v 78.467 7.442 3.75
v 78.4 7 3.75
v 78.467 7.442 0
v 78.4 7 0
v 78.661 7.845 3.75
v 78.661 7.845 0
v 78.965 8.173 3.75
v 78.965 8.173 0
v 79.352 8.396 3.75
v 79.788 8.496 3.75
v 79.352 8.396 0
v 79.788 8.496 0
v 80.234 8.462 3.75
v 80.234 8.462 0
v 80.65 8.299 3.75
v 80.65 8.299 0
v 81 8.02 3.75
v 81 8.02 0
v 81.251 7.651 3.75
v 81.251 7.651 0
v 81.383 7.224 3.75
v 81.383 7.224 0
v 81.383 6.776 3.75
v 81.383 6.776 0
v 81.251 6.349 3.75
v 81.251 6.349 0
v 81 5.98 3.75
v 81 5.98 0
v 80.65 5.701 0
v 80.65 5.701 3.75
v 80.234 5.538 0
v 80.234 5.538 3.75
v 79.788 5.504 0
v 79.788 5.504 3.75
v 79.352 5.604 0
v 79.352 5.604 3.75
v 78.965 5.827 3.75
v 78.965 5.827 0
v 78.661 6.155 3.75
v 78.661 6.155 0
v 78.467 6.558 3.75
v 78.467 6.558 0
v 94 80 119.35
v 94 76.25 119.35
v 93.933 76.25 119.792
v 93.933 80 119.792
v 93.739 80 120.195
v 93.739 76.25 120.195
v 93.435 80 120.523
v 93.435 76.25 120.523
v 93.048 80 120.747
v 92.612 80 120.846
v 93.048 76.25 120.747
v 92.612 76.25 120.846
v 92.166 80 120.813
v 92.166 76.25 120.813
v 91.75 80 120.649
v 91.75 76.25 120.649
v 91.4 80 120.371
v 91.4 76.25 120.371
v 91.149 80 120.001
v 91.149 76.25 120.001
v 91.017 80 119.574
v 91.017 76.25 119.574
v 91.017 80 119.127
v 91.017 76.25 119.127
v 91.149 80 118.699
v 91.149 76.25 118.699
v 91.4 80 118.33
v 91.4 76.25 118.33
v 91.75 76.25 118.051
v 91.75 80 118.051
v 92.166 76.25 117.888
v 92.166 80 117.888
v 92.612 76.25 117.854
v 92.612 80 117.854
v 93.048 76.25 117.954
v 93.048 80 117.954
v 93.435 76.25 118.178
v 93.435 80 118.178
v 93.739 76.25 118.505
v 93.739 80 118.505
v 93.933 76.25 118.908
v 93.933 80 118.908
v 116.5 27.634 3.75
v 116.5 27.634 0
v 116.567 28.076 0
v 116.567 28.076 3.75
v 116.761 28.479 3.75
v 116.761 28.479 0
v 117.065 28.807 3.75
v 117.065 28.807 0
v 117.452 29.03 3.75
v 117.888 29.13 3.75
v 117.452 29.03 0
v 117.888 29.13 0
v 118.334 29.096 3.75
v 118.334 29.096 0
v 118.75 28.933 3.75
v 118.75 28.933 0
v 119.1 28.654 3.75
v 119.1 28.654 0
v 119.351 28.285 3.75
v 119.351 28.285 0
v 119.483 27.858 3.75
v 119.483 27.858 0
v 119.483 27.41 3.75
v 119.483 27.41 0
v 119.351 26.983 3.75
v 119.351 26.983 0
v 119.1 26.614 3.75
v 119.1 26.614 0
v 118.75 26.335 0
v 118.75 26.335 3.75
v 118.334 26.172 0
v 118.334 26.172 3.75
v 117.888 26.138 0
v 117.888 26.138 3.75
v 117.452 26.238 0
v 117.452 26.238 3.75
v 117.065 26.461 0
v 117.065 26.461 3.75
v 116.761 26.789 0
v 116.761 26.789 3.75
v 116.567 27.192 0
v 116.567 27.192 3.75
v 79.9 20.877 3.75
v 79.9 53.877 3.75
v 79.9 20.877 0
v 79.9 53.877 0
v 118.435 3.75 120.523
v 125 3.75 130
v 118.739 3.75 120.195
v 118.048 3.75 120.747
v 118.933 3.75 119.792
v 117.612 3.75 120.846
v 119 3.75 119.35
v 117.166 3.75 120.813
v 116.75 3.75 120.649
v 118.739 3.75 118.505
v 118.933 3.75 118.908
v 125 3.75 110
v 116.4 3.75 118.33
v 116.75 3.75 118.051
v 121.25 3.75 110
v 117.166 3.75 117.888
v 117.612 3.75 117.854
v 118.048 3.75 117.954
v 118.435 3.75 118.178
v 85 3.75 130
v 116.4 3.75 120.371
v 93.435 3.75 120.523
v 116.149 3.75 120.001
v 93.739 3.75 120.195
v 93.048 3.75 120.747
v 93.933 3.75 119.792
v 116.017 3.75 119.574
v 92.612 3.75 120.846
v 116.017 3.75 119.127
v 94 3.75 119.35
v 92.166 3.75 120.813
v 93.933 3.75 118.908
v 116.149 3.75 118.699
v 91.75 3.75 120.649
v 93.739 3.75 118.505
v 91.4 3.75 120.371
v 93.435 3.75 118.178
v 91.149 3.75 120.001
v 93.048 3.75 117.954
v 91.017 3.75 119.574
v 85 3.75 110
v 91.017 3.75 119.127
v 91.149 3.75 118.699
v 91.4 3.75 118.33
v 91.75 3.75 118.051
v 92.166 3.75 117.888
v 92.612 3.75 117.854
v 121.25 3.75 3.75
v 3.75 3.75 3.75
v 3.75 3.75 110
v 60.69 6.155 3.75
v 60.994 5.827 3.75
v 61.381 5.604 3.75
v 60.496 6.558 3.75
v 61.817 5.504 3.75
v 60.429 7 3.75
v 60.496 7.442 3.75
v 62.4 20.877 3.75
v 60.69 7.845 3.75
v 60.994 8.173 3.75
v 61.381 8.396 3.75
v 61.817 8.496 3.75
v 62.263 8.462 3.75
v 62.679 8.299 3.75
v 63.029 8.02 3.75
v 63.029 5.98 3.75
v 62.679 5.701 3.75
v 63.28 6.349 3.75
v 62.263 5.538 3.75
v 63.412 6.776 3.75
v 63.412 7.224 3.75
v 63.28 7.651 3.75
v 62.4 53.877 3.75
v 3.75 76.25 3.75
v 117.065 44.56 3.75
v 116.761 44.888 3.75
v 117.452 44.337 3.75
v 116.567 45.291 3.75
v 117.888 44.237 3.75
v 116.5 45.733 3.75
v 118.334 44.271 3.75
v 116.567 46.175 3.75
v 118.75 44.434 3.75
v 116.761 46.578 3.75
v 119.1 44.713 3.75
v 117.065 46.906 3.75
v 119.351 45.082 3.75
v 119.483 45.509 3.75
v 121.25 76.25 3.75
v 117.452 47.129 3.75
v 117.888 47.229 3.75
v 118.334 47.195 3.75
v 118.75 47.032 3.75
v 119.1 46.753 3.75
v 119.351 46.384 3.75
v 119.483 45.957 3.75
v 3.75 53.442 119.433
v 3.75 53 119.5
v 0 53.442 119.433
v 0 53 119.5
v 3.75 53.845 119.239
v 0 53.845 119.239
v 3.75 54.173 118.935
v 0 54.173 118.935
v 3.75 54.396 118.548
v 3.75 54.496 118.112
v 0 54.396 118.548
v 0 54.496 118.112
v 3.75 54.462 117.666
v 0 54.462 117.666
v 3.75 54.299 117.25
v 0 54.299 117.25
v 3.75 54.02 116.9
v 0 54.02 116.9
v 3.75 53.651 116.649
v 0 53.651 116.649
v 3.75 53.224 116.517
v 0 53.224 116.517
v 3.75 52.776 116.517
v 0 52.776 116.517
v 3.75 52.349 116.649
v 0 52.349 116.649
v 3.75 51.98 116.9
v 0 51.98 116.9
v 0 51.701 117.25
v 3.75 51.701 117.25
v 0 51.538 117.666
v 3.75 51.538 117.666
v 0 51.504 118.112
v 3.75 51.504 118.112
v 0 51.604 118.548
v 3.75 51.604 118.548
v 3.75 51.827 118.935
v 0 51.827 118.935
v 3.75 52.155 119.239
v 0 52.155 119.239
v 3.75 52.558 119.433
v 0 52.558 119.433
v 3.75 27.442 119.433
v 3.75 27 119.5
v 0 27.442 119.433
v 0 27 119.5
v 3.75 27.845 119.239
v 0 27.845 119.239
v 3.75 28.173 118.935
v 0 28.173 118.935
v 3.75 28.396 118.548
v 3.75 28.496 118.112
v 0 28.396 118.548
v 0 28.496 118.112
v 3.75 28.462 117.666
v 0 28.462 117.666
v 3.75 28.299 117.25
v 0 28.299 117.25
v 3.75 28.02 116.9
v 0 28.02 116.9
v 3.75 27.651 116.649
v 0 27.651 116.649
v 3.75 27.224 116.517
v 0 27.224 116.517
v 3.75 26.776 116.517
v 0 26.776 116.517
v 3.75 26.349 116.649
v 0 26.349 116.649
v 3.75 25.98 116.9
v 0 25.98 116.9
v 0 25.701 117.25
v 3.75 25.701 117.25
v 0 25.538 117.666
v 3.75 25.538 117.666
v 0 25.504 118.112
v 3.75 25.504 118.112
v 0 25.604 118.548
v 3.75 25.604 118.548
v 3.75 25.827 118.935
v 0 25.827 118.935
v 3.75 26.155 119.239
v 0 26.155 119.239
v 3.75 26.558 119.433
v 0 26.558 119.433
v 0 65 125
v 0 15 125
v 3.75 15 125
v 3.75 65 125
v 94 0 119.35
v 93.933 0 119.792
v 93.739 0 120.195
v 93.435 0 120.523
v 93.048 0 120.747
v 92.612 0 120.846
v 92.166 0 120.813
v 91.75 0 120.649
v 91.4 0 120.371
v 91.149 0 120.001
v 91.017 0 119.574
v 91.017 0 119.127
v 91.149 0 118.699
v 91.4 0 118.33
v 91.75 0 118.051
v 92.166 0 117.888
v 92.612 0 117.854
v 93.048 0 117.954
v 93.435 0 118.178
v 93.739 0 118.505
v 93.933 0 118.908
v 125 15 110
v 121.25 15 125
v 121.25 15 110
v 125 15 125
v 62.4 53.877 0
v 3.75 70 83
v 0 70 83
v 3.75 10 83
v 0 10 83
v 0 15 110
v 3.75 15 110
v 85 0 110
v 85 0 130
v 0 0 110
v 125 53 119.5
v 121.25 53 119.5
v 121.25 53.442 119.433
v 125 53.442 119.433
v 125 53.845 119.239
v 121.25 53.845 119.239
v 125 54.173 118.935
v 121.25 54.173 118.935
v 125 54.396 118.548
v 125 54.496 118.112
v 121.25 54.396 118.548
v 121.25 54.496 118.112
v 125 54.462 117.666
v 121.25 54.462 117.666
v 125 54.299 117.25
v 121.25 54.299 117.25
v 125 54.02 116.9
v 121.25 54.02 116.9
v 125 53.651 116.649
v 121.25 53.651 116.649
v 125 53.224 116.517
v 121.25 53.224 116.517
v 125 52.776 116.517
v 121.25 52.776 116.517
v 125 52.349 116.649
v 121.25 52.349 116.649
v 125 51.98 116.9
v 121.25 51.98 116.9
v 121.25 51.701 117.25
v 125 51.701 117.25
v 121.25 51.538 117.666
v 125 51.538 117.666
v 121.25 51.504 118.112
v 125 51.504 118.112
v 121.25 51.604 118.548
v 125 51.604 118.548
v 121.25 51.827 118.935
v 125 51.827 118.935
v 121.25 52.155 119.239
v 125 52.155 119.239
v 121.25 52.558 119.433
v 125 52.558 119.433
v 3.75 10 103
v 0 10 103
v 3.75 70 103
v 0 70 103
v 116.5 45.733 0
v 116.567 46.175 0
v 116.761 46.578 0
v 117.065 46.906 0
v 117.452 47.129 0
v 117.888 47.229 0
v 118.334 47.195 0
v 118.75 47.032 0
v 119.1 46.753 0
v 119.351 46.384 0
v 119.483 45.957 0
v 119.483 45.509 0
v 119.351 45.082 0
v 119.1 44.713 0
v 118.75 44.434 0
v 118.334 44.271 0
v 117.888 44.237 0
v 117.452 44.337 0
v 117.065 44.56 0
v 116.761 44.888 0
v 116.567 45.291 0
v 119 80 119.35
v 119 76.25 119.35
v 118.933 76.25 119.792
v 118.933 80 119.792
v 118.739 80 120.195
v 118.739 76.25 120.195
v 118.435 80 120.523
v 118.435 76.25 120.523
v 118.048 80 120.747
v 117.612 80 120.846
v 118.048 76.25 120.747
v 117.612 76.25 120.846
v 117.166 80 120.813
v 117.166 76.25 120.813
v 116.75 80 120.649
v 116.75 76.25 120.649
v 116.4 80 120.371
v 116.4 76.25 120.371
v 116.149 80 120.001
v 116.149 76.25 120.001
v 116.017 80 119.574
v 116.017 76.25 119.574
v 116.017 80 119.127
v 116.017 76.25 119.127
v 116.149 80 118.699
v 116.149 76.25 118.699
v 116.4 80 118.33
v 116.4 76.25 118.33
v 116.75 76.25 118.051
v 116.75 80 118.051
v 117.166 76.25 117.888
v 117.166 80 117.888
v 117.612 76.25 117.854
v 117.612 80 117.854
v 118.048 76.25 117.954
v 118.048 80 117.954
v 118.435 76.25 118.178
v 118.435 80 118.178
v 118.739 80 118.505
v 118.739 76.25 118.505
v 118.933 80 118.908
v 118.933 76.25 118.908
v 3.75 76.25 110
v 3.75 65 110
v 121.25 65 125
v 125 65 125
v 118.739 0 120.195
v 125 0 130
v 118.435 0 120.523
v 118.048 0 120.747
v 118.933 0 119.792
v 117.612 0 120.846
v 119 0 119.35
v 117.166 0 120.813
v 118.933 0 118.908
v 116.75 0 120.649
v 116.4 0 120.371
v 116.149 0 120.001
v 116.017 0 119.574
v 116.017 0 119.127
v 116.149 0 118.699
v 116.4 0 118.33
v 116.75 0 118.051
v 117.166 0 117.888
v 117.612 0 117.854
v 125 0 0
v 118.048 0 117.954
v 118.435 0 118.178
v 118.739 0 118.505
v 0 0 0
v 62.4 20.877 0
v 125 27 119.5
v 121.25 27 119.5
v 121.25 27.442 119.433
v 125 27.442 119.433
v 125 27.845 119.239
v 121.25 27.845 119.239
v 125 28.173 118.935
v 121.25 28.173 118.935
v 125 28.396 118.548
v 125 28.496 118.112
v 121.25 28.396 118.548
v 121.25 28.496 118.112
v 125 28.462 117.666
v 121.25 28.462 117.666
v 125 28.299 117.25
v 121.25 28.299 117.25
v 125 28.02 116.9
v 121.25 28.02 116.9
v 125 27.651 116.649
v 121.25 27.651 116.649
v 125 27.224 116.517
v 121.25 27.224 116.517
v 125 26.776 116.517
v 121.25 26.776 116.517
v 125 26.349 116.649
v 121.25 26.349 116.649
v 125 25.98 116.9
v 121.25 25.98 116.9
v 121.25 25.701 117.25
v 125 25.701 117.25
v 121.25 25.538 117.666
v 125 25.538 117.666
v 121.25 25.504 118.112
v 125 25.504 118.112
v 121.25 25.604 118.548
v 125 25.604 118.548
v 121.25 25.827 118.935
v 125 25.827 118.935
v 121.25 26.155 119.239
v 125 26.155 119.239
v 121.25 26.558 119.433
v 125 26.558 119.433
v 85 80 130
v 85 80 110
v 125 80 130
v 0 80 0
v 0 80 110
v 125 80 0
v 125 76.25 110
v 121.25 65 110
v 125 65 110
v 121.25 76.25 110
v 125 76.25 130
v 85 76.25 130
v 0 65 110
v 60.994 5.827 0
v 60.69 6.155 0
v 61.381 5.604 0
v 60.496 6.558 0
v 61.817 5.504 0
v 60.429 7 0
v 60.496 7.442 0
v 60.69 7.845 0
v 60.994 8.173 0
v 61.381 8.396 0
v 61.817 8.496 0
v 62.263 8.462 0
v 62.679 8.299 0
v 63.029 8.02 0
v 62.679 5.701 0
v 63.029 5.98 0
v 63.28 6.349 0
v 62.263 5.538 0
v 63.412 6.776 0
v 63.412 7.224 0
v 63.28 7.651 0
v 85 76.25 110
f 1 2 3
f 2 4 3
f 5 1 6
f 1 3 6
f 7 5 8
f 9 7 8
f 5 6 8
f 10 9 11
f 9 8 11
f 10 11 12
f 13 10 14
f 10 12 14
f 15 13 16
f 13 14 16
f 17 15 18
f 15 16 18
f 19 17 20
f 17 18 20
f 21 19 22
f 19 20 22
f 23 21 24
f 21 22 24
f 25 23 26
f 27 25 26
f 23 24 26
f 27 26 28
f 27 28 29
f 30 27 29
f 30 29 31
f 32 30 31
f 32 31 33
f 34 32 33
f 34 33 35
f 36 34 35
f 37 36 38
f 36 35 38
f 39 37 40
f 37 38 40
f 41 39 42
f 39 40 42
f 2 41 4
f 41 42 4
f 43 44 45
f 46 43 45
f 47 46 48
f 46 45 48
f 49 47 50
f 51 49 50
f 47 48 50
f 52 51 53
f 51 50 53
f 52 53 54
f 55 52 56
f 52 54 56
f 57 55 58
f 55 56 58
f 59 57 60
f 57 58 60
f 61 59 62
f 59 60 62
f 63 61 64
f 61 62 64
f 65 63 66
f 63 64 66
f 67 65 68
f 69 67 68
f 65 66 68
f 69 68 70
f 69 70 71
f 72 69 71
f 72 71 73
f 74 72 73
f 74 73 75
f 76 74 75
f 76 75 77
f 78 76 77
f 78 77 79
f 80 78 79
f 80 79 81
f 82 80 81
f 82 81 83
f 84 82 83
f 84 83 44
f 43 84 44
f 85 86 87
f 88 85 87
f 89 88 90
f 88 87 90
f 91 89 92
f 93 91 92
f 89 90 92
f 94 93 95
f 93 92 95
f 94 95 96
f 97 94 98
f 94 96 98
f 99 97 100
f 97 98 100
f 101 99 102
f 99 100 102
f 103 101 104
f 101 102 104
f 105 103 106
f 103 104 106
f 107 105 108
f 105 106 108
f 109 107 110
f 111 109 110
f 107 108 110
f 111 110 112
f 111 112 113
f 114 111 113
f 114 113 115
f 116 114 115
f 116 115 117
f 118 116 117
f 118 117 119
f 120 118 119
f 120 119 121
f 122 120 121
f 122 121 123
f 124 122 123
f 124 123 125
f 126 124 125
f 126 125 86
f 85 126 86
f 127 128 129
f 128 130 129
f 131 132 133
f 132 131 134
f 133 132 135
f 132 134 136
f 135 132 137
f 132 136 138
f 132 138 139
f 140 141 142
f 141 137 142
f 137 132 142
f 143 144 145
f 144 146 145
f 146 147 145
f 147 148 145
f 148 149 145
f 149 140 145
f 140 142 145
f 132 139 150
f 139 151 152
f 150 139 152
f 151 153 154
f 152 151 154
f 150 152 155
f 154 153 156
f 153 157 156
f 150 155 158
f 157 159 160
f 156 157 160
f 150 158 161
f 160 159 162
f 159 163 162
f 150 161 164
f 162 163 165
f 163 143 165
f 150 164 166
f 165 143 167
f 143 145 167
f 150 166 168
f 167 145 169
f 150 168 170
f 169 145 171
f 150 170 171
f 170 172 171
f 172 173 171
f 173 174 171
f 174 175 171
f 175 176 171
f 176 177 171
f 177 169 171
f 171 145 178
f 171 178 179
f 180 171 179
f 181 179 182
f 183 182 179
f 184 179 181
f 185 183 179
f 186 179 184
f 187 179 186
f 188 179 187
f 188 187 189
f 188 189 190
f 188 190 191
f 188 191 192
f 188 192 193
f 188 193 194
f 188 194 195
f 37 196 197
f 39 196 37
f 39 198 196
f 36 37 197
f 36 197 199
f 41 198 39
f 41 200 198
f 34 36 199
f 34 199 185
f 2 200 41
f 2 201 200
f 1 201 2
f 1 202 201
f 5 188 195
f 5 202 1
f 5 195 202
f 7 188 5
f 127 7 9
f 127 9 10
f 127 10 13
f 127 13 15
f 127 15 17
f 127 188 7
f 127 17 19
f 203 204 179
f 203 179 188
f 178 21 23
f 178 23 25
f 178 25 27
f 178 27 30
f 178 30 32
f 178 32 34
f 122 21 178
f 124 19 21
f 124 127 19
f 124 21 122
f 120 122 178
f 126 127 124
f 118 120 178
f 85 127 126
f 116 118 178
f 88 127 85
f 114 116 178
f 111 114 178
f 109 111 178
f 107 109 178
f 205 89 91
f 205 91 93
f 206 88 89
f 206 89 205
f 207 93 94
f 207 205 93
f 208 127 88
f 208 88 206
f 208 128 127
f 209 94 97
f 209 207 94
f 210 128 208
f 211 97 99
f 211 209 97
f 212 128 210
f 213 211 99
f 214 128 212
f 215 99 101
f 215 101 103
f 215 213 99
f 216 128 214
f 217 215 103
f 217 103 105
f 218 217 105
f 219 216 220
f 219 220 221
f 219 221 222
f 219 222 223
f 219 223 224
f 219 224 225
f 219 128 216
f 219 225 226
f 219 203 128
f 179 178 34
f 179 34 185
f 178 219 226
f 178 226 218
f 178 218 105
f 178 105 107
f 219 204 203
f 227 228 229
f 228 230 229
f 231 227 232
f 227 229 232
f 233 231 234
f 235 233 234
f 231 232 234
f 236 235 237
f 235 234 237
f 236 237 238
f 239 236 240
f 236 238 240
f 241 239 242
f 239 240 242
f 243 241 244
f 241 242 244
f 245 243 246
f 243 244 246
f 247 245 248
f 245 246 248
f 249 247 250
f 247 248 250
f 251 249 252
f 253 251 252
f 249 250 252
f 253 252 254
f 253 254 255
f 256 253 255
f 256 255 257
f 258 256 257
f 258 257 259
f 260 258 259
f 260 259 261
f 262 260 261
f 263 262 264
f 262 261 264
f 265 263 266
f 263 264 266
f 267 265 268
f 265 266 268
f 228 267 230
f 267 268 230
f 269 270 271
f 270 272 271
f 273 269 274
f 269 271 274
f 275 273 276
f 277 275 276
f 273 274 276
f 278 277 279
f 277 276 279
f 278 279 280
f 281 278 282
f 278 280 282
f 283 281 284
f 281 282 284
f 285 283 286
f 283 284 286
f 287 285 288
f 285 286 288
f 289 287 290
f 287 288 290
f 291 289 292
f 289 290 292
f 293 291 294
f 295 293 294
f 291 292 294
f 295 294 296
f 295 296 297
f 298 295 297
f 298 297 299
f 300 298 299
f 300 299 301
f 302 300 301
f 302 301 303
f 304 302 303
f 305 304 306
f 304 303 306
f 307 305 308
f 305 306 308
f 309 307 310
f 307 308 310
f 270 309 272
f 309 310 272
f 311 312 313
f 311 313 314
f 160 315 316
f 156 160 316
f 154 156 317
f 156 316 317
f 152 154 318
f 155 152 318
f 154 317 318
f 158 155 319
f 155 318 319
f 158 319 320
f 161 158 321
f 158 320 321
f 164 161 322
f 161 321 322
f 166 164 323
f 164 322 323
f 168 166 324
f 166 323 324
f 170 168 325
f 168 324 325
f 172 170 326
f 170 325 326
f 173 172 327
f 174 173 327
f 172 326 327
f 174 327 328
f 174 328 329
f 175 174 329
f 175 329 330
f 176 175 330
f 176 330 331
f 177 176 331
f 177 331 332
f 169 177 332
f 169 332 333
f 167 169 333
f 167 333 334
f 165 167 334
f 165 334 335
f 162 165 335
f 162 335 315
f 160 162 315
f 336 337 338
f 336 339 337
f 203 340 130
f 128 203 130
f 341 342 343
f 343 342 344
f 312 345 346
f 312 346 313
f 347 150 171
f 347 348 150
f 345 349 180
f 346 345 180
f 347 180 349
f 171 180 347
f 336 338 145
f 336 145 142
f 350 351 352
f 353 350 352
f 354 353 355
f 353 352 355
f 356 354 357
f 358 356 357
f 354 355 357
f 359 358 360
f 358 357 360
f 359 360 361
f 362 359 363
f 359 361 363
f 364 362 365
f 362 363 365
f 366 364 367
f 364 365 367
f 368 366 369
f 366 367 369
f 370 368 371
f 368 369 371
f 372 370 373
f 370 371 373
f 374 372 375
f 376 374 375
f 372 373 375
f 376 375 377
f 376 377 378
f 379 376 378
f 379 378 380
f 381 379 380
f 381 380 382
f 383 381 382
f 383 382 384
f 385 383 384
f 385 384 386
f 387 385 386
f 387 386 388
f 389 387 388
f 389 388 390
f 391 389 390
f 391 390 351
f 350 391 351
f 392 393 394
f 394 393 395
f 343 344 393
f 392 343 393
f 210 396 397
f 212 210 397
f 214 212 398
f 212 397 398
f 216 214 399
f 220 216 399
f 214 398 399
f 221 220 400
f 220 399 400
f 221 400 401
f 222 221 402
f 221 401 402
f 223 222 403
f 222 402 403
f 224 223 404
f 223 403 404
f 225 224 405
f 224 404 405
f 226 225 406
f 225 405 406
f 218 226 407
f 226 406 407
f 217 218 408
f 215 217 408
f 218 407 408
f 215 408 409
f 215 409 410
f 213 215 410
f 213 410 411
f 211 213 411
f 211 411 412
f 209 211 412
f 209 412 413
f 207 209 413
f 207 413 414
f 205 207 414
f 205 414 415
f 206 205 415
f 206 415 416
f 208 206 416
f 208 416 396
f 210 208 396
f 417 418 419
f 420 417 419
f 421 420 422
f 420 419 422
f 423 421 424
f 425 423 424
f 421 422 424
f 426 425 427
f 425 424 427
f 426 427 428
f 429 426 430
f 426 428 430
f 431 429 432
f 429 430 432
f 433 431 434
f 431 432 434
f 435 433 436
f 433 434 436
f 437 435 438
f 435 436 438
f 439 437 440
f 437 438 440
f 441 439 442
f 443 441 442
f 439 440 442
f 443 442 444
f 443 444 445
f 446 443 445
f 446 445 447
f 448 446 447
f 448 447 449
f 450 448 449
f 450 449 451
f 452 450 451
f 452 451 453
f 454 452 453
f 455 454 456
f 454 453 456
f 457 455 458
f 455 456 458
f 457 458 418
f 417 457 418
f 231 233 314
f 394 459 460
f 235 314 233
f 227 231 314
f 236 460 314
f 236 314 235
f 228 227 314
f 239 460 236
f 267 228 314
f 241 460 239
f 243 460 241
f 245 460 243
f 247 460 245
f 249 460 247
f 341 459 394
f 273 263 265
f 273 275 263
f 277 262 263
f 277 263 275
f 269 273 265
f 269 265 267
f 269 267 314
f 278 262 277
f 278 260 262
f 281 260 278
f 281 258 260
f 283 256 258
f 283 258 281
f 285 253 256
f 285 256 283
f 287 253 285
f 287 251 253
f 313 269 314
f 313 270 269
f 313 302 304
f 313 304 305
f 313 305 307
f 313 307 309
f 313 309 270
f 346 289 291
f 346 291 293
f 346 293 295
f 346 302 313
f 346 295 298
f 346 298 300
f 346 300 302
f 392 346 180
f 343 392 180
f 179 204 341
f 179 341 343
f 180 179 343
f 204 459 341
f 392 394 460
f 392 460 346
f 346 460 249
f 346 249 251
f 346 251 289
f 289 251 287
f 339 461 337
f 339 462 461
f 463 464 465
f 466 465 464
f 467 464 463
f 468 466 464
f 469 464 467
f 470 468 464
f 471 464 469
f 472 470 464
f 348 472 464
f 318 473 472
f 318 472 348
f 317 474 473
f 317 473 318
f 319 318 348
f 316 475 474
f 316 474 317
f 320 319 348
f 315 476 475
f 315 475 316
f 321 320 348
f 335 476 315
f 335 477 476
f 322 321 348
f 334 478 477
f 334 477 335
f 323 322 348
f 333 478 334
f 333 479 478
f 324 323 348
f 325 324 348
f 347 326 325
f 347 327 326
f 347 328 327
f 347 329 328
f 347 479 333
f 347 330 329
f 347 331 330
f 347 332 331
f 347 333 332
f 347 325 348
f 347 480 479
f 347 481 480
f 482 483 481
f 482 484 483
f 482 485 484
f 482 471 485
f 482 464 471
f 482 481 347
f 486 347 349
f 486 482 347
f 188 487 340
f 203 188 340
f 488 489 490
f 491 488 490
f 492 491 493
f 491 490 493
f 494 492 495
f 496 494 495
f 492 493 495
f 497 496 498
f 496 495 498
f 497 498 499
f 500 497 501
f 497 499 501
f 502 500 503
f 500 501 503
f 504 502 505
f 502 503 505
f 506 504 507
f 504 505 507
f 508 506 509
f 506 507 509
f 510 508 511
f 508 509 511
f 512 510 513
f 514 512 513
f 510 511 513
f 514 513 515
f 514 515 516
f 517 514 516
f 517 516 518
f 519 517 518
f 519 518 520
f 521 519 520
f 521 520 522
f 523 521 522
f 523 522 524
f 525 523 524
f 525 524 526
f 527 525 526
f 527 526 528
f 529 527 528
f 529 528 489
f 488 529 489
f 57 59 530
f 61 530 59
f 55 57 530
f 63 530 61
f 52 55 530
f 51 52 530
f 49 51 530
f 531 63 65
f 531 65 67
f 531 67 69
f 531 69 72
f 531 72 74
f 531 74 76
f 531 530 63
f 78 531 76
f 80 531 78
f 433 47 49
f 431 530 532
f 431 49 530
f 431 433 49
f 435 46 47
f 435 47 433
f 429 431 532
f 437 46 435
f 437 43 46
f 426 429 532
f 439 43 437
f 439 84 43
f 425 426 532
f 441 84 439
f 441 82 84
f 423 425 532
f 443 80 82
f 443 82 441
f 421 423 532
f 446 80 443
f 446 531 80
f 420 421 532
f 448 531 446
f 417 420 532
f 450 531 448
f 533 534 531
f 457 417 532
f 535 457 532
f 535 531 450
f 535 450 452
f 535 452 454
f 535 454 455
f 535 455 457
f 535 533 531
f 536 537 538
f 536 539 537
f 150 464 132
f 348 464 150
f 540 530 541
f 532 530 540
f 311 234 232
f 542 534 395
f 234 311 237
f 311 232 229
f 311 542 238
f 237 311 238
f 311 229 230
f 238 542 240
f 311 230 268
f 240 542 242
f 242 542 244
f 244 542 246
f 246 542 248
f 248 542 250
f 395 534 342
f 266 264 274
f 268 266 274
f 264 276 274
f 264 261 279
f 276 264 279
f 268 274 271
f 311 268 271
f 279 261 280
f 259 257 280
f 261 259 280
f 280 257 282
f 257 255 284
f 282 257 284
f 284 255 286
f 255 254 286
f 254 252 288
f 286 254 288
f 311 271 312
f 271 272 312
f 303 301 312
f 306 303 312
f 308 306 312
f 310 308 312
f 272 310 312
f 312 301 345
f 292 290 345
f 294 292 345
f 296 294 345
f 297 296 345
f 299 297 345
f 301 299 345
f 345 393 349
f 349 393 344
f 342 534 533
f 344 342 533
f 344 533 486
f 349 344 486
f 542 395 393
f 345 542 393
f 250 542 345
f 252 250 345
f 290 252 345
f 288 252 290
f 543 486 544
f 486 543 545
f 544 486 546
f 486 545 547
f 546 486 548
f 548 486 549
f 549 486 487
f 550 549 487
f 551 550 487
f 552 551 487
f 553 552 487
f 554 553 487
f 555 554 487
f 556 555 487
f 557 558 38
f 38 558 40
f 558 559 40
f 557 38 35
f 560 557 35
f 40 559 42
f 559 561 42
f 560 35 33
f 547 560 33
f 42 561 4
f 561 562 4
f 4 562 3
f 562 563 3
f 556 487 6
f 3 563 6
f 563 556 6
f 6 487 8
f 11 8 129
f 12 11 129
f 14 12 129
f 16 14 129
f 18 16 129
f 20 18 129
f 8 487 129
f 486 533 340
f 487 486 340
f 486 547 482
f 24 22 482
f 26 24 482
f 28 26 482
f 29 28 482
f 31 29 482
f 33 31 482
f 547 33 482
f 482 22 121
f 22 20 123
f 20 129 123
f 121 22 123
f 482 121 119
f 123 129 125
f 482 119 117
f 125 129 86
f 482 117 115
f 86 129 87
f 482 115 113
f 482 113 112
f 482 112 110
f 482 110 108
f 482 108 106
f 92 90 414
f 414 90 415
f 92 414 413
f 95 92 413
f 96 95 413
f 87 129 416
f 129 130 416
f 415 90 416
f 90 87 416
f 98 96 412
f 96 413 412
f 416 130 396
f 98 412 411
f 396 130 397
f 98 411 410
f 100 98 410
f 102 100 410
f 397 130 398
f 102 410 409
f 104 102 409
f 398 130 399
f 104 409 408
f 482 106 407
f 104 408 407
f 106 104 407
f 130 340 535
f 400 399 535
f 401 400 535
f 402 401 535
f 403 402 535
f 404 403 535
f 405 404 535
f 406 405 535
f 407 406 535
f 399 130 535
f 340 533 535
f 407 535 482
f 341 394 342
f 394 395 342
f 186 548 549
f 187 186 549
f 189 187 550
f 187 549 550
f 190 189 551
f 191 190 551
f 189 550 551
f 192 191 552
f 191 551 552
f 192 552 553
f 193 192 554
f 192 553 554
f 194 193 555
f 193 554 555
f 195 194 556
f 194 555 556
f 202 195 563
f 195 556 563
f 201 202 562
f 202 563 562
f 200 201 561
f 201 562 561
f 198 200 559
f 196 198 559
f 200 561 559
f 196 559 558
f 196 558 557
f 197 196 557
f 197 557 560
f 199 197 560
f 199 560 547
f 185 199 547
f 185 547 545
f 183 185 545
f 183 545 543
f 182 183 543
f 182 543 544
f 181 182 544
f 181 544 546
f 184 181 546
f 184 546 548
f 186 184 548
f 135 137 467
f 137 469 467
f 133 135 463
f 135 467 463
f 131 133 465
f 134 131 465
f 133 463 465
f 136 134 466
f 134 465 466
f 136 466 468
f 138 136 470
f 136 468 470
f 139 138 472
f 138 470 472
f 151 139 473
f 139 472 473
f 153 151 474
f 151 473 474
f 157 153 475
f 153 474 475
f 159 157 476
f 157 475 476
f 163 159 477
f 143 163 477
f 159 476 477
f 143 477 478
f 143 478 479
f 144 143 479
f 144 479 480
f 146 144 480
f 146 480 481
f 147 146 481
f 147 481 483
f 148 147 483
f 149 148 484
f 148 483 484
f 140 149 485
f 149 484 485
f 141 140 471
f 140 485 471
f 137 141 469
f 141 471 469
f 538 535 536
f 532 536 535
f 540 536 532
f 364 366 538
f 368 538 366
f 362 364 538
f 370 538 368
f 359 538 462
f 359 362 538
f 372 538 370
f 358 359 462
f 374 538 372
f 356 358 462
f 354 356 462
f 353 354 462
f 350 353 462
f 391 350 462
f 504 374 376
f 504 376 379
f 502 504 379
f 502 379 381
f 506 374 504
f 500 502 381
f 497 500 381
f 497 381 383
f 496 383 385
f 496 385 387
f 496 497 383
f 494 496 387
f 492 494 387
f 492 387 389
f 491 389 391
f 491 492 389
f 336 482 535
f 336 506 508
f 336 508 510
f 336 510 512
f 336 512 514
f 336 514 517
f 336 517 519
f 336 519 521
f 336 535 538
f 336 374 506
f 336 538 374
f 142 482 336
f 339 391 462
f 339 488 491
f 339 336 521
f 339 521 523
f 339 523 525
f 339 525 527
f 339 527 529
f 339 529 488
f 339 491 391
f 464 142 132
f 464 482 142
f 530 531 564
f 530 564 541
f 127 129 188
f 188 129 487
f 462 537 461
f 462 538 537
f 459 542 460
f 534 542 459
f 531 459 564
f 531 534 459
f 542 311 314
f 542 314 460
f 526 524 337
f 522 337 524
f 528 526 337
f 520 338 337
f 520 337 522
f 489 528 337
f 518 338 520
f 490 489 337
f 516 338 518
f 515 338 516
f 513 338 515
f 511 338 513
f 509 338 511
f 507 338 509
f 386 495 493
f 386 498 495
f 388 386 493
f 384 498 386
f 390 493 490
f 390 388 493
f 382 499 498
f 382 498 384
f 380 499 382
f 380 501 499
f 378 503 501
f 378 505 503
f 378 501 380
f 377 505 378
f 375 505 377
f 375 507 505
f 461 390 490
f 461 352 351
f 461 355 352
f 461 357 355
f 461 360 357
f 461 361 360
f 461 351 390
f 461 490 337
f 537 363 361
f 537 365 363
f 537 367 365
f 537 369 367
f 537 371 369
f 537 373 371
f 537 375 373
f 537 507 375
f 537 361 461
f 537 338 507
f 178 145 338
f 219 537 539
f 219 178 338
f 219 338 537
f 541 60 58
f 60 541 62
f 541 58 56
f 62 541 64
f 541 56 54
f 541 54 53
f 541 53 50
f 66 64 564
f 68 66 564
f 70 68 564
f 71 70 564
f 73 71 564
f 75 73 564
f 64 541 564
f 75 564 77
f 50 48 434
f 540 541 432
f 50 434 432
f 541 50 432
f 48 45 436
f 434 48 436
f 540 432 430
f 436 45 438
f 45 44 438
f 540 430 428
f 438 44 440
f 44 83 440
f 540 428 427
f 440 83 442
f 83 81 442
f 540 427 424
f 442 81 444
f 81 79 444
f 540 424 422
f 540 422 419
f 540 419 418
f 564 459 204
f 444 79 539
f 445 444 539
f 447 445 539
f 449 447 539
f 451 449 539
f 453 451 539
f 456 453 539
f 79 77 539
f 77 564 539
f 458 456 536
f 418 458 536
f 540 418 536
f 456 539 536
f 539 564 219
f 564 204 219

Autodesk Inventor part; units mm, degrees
ref_plane "XY Plane" through (0, 0, 0) normal (0, 0, 1) x (1, 0, 0)
sketch "Sketch1" plane through (0, 0, 0) normal (0, 0, 1) x (1, 0, 0)
  line L0 (0, 0) -> (125, 0)
  line L1 (125, 0) -> (125, 80)
  line L2 (125, 80) -> (0, 80)
  line L3 (0, 80) -> (0, 0)
  dimension "d0" = 125
  dimension "d1" = 80
extrude "Extrusion1" add sketch "Sketch1" along normal blind 110
shell "Shell1" thickness 3.75 removed faces 1 at (83.3333, 26.6667, 110)
sketch "Sketch2" plane through (0, 0, 0) normal (0, 0, -1) x (-1, 0, 0)
  line L0 (0, 80) -> (0, 0) projected
  line L1 (-125, 80) -> (0, 80) projected
  line L2 (0, 0) -> (-125, 0) projected
  line L3 (-125, 0) -> (-125, 80) projected
  circle A0 centre (-118, 27.634) radius 1.5
  circle A1 centre (-118, 45.733) radius 1.5
  circle A2 centre (-79.9, 7) radius 1.5
  circle A3 centre (-61.929, 7) radius 1.5
  line L4 (-62.4, 53.8768) -> (-79.9, 53.8768)
  line L5 (-79.9, 53.8768) -> (-79.9, 20.8768)
  line L6 (-79.9, 20.8768) -> (-62.4, 20.8768)
  line L7 (-62.4, 20.8768) -> (-62.4, 53.8768)
  dimension "d22" = 3
  dimension "d23" = 3
  dimension "d24" = 7
  dimension "d25" = 7
  dimension "d26" = 27.634
  dimension "d46" = 45.733
  dimension "d77" = 3
  dimension "d78" = 3
  dimension "d79" = 7
  dimension "d80" = 7
  dimension "d81" = 45.1
  dimension "d82" = 63.071
  dimension "d83" = 45.1
  dimension "d84" = 20.8768
  dimension "d85" = 33
  dimension "d86" = 17.5
extrude "Extrusion6" cut sketch "Sketch2" against normal blind 20 contours A0 | A1 | A2 | A3 | L7 L6 L5 L4
sketch "Sketch6" plane through (0, 80, 0) normal (0, 1, 0) x (1, 0, 0)
  line L0 (0, -110) -> (125, -110) projected
  line L1 (125, -110) -> (85, -110)
  line L2 (85, -110) -> (85, -130)
  line L3 (85, -130) -> (125, -130)
  line L4 (125, -130) -> (125, -110)
  point P0 (0, 0)
  dimension "d53" = 40
  dimension "d54" = 20
extrude "Extrusion8" add sketch "Sketch6" against normal blind 3.75
ref_plane "Work Plane1" through (0, 40, 0) normal (0, 1, 0) x (-1, 0, 0)
mirror "Mirror1" about plane through (0, 40, 0) normal (0, 1, 0) of "Extrusion8"
sketch "Sketch7" plane through (0, 0, 0) normal (-1, 0, 0) x (0, 0, 1)
  line L0 (110, 3.75) -> (110, 76.25) projected
  line L1 (110, 15) -> (125, 15)
  line L2 (125, 15) -> (125, 65)
  line L3 (125, 65) -> (110, 65)
  line L4 (110, 65) -> (110, 15)
  line L5 (130, 76.25) -> (110, 76.25) projected
  line L6 (130, 3.75) -> (110, 3.75) projected
  point P0 (0, 0)
  dimension "d58" = 15
  dimension "d59" = 50
  dimension "d60" = 11.25
  dimension "d61" = 11.25
extrude "Extrusion9" add sketch "Sketch7" against normal blind 3.75
ref_plane "Work Plane2" through (62.5, 0, 0) normal (1, 0, 0) x (0, 1, 0)
mirror "Mirror2" about plane through (62.5, 0, 0) normal (1, 0, 0) of "Extrusion9"
sketch "Sketch8" plane through (0, 0, 0) normal (-1, 0, 0) x (0, 0, 1)
  line L0 (103, 70) -> (83, 70)
  line L1 (83, 70) -> (83, 10)
  line L2 (83, 10) -> (103, 10)
  line L3 (103, 10) -> (103, 70)
  line L4 (110, 3.75) -> (110, 15) projected
  line L5 (0, 0) -> (110, 0) projected
  line L6 (0, 80) -> (110, 80) projected
  dimension "d70" = 20
  dimension "d71" = 60
  dimension "d72" = 7
  dimension "d73" = 10
  dimension "d74" = 10
extrude "Extrusion11" cut sketch "Sketch8" against normal blind 10
sketch "Sketch9" plane through (0, 0, 0) normal (-1, 0, 0) x (0, 0, 1)
  circle A0 centre (118, 53) radius 1.5
  circle A1 centre (118, 27) radius 1.5
  line L0 (110, 15) -> (125, 15) projected
  line L1 (125, 15) -> (125, 65) projected
  line L2 (125, 65) -> (110, 65) projected
  point P0 (0, 0)
  dimension "d87" = 3
  dimension "d88" = 3
  dimension "d89" = 12
  dimension "d90" = 7
  dimension "d91" = 12
  dimension "d92" = 7
extrude "Extrusion12" cut sketch "Sketch9" against normal blind 200
sketch "Sketch10" plane through (0, 0, 0) normal (0, -1, 0) x (1, 0, 0)
  circle A0 centre (92.5, 119.3503) radius 1.5
  circle A1 centre (117.5, 119.3503) radius 1.5
  line L0 (125, 0) -> (125, 130) projected
  line L1 (85, 110) -> (85, 130) projected
  line L2 (85, 130) -> (125, 130) projected
  point P0 (0, 0)
  dimension "d95" = 3
  dimension "d96" = 3
  dimension "d97" = 7.5
  dimension "d98" = 7.5
  dimension "d99" = 10.6497
  dimension "d100" = 10.6497
extrude "Extrusion13" cut sketch "Sketch10" against normal blind 100
properties part number "Main Part"
